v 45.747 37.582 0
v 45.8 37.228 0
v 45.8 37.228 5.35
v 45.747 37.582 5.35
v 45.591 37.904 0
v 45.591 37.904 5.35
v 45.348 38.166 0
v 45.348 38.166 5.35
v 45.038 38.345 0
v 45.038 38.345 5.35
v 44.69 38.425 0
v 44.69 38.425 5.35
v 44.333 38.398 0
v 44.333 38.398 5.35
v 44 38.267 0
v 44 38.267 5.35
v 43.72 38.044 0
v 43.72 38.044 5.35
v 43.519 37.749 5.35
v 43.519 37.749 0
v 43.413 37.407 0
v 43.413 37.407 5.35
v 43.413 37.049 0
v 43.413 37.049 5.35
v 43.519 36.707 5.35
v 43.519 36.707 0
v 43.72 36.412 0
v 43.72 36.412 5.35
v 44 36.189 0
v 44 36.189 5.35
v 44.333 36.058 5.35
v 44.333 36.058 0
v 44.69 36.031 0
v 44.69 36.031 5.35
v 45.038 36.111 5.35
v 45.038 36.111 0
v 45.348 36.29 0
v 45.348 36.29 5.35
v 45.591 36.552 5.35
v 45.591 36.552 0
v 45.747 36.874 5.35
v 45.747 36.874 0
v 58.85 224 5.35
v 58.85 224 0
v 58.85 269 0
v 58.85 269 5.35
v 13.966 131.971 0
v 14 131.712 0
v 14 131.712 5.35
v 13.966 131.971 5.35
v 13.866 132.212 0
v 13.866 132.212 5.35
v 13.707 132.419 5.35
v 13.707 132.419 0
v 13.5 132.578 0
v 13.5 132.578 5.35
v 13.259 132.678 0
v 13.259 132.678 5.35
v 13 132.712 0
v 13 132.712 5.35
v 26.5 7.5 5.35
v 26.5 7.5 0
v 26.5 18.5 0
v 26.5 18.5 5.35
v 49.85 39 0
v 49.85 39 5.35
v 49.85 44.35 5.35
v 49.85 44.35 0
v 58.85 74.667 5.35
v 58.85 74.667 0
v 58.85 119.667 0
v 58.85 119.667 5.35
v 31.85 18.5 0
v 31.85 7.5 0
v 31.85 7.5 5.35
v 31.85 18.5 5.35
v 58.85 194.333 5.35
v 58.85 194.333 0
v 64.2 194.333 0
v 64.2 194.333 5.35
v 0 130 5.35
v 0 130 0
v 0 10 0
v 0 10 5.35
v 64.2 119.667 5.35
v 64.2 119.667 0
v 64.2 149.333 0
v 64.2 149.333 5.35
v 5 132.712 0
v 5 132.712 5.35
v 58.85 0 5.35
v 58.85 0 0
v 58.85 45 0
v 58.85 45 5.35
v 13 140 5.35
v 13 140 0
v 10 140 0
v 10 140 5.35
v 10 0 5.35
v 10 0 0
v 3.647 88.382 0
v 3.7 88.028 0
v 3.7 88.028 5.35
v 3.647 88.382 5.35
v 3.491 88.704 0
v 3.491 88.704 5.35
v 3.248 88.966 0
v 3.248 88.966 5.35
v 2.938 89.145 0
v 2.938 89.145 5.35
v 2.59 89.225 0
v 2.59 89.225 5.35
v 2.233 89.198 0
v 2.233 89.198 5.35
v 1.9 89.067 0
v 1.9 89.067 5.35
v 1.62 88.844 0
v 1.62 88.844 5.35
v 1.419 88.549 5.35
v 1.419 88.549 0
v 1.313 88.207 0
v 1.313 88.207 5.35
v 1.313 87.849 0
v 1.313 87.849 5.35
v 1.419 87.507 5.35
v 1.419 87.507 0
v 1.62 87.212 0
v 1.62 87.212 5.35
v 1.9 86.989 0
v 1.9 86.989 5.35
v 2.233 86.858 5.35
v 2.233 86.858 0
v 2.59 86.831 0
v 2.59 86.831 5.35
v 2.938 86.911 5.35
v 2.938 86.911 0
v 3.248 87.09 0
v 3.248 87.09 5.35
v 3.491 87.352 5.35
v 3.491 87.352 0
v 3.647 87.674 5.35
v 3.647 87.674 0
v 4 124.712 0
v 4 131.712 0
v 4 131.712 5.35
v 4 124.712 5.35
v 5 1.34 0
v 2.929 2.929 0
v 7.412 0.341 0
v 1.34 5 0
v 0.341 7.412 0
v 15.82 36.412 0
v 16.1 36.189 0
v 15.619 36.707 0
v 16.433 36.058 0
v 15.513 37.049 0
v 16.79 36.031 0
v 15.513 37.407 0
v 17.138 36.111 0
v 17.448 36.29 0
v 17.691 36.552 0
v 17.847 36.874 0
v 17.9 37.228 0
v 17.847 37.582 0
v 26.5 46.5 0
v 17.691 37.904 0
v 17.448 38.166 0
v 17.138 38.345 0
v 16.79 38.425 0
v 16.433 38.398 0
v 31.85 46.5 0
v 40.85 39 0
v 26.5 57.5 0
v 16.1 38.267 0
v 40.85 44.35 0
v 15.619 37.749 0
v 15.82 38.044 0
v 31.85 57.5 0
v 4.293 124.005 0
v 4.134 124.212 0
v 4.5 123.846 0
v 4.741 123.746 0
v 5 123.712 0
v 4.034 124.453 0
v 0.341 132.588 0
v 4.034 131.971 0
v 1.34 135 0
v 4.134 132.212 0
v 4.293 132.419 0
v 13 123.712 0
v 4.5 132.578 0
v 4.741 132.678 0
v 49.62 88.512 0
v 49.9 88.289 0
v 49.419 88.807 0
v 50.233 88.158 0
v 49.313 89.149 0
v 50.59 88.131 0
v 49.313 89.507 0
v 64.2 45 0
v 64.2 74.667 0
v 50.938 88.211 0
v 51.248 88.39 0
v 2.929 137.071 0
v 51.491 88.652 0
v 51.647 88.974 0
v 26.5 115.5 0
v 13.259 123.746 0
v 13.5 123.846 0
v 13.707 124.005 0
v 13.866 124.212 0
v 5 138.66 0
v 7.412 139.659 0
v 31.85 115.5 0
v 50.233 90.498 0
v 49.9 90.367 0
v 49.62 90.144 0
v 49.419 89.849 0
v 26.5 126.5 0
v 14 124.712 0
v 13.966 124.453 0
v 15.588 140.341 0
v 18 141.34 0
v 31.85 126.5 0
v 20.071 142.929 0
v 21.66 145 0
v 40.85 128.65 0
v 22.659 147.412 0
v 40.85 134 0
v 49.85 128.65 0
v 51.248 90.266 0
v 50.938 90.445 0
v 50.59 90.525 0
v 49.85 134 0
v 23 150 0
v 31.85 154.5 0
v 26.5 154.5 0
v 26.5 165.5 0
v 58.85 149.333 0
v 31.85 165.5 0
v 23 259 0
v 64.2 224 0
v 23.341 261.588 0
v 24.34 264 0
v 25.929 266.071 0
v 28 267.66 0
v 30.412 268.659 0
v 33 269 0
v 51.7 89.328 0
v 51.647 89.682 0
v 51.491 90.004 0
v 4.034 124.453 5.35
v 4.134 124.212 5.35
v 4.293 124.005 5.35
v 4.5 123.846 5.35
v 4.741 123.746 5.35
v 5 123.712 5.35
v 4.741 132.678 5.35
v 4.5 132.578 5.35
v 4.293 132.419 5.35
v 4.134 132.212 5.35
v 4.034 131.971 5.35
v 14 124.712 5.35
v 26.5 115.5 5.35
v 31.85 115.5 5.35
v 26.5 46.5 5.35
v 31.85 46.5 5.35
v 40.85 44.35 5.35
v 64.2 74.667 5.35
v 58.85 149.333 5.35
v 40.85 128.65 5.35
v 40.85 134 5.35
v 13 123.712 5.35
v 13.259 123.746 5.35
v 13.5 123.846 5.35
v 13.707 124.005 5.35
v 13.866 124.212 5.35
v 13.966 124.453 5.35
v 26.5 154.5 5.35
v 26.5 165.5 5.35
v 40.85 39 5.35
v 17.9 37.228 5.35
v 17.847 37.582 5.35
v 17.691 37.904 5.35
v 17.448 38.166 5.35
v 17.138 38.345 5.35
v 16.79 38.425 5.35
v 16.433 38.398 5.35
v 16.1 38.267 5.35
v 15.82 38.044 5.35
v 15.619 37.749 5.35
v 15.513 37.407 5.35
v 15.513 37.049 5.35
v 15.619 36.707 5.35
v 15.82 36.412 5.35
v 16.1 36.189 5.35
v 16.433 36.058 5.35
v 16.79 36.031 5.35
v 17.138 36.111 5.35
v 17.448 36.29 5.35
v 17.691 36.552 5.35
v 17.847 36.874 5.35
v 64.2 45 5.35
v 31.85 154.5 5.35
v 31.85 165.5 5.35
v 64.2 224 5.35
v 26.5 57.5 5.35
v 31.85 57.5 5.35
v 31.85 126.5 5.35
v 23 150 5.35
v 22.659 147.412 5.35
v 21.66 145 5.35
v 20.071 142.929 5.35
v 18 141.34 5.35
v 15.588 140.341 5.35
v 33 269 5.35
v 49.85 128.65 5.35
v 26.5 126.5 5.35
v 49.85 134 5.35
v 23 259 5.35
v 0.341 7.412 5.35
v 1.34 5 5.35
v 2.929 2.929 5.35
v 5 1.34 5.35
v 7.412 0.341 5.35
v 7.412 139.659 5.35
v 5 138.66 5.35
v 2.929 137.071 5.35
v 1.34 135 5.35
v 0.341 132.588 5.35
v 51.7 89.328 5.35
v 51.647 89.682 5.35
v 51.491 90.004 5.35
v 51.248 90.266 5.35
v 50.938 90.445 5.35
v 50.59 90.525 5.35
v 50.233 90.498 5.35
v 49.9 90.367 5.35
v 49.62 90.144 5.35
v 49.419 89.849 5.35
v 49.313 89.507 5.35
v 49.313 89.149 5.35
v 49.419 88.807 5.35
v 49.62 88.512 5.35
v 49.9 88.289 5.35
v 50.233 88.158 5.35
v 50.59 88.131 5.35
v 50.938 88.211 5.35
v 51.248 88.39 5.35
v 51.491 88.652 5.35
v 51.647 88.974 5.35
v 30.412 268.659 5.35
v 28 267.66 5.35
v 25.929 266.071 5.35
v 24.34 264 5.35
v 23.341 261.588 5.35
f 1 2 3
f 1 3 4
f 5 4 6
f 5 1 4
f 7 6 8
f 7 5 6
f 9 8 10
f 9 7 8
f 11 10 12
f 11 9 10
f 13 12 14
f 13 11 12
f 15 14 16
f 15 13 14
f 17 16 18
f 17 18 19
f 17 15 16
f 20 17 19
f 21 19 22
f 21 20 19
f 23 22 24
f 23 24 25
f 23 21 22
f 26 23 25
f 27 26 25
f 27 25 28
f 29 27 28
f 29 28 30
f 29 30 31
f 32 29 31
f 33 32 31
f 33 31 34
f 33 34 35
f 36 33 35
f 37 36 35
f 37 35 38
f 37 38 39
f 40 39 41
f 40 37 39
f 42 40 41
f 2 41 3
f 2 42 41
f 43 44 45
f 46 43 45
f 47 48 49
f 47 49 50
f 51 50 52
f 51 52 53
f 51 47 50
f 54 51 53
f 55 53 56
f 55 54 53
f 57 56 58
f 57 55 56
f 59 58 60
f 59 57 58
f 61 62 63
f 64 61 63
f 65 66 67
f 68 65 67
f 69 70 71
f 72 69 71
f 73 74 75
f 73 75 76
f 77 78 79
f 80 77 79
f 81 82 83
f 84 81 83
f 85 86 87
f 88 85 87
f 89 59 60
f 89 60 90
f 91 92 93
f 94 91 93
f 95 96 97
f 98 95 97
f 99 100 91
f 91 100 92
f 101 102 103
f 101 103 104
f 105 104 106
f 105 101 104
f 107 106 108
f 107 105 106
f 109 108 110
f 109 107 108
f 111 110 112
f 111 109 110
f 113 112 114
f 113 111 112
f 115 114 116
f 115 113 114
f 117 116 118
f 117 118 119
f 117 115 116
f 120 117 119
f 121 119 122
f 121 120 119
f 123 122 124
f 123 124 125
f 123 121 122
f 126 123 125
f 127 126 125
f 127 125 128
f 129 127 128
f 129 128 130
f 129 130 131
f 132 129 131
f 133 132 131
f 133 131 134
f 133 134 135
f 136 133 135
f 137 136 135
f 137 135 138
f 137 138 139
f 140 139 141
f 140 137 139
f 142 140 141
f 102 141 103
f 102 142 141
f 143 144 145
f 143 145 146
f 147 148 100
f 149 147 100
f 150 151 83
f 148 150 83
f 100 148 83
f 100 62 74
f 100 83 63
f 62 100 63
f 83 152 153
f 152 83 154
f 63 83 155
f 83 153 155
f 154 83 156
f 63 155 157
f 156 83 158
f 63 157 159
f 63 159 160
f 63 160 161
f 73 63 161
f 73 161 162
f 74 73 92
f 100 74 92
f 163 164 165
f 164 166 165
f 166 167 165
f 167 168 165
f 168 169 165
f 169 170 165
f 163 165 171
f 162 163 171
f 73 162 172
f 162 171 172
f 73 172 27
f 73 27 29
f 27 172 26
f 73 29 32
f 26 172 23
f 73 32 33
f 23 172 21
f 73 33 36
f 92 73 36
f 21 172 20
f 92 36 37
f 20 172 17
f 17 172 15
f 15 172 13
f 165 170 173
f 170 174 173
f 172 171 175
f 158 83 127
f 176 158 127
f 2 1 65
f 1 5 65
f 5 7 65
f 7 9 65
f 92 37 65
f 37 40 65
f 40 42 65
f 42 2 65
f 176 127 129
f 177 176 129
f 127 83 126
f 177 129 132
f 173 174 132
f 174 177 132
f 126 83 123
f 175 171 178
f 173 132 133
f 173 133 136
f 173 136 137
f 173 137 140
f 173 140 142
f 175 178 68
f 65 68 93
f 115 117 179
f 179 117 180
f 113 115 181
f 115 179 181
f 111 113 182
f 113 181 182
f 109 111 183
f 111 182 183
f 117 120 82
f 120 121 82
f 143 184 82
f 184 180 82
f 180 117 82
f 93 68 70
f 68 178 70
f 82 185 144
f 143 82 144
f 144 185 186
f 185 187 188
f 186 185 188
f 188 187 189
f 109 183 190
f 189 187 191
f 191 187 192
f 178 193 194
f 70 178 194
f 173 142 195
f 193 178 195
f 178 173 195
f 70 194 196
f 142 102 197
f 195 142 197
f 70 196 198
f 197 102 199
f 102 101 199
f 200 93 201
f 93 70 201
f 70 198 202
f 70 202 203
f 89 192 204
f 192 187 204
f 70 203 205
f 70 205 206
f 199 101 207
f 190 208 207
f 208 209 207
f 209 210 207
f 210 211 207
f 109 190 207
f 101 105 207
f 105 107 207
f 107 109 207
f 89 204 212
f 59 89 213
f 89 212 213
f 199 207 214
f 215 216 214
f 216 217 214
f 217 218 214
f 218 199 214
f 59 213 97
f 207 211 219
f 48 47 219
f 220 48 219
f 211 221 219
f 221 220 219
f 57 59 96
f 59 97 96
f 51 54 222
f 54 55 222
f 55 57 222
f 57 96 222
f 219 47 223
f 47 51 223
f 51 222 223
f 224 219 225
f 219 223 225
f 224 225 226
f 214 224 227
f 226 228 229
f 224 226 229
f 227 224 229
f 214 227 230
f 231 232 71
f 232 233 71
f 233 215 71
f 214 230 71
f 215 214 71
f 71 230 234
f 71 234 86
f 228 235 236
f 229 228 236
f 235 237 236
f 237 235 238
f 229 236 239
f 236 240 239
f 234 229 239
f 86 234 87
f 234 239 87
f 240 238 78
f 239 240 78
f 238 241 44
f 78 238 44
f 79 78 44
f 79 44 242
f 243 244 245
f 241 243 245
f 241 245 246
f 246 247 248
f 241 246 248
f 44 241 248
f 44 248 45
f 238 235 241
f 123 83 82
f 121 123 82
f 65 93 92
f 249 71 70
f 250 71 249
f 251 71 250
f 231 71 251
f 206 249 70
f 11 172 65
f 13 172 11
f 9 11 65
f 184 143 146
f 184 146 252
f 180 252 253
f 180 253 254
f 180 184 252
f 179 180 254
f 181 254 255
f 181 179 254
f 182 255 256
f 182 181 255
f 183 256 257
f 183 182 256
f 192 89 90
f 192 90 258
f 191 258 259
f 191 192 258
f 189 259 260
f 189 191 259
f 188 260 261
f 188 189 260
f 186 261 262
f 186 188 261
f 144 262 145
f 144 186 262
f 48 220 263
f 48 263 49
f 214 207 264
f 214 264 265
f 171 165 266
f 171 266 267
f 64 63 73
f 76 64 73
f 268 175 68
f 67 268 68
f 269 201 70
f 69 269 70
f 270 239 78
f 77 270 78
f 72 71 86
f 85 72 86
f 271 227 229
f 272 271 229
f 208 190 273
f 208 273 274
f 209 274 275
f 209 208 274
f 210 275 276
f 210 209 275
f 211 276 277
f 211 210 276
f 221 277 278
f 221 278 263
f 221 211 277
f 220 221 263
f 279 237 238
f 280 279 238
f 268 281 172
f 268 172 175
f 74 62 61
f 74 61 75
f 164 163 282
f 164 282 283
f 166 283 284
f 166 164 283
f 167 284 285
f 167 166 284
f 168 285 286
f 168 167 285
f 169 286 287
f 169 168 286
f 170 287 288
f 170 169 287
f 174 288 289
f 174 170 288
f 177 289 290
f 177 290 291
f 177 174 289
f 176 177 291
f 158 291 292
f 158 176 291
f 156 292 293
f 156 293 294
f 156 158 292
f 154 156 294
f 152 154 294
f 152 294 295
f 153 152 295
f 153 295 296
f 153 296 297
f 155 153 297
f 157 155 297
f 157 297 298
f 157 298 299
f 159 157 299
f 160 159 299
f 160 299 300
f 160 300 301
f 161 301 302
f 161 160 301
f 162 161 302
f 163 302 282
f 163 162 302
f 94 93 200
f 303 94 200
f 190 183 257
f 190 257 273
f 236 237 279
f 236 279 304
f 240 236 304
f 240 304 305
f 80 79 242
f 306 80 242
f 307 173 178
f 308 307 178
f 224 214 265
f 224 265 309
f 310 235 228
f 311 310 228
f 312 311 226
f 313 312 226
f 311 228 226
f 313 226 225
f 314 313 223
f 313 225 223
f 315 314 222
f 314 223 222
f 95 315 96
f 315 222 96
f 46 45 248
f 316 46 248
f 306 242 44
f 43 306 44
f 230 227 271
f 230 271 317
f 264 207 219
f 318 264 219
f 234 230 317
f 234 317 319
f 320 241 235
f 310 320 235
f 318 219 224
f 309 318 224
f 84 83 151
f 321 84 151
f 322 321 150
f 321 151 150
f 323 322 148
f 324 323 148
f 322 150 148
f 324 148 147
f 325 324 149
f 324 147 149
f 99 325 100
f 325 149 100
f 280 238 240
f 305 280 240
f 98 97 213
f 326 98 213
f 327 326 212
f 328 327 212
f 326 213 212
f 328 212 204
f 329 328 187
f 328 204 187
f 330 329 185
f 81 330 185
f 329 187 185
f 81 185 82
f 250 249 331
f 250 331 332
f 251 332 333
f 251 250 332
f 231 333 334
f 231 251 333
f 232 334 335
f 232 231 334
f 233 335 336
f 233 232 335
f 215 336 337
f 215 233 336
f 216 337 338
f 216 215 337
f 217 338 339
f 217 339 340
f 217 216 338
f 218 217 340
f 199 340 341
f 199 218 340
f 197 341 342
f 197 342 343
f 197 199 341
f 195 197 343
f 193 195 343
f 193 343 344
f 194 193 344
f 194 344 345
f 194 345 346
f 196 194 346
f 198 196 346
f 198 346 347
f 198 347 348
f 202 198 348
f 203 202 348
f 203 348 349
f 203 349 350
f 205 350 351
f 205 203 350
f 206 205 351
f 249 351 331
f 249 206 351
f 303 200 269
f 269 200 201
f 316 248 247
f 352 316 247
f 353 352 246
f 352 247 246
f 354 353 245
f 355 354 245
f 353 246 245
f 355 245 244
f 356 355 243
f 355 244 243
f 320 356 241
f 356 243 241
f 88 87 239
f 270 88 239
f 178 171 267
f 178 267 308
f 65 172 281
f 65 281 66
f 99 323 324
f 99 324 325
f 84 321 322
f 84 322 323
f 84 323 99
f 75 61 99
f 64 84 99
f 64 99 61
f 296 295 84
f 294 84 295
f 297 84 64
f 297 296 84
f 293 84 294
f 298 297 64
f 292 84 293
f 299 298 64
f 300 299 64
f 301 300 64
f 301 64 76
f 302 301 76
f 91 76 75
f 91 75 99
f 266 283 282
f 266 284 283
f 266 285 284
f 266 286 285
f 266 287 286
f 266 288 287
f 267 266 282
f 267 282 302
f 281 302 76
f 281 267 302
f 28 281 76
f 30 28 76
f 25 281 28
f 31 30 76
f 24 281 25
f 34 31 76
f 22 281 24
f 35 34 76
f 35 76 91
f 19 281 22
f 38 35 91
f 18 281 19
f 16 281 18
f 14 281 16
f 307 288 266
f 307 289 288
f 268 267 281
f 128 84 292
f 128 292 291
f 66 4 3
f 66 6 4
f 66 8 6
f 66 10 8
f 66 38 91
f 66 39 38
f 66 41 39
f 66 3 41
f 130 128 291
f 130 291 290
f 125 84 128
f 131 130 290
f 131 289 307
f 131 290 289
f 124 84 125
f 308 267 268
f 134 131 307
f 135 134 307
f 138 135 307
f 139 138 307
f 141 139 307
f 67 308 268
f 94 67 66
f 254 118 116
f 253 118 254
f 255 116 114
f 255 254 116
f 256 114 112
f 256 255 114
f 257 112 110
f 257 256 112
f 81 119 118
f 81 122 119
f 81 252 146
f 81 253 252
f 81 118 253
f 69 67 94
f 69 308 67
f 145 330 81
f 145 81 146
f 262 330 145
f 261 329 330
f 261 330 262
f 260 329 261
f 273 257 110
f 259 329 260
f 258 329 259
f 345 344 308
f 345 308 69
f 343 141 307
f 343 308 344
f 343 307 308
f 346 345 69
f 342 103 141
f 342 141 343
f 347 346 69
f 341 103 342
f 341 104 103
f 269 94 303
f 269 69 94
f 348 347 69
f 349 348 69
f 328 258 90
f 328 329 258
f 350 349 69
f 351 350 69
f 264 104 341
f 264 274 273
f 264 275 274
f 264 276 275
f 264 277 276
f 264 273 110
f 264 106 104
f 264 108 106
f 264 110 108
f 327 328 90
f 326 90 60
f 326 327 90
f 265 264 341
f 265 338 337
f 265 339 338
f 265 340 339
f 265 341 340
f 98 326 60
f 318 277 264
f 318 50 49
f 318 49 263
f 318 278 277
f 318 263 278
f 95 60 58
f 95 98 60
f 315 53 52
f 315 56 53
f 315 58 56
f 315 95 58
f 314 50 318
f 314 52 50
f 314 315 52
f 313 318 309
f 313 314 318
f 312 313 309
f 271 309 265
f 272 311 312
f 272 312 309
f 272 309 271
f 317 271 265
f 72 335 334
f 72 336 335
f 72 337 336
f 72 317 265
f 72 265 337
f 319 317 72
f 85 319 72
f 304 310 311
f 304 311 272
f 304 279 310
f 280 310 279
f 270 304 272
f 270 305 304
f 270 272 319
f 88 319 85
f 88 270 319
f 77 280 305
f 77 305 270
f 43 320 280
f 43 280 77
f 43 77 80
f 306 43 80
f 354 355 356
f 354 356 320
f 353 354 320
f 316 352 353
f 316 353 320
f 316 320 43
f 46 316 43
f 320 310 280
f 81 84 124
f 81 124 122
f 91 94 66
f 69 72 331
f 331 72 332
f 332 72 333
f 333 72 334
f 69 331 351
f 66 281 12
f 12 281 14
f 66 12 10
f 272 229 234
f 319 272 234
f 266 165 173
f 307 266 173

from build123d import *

# Parameters (mm, degrees)
MODEL_R             = 1.2
MODEL_W             = 5.35
MODEL_H             = 11
MODEL_W_2           = 9
MODEL_H_2           = 5.35
BOSS_EXTRUDE1_DEPTH = 5.35


with BuildPart() as part:
    # Model → Boss-Extrude1 (new body)
    with BuildSketch(Plane.XY):
        with BuildLine():
            Line((58.85, 269), (33, 269))
            ThreePointArc((33, 269), (25.928932188, 266.071067812), (23, 259))
            Line((23, 259), (23, 150))
            ThreePointArc((23, 150), (20.071067812, 142.928932188), (13, 140))
            Line((13, 140), (10, 140))
            ThreePointArc((10, 140), (2.928932188, 137.071067812), (0, 130))
            Line((0, 130), (0, 10))
            ThreePointArc((0, 10), (2.928932188, 2.928932188), (10, 0))
            Line((10, 0), (58.85, 0))
            Line((58.85, 0), (58.85, 45))
            Line((58.85, 45), (64.2, 45))
            Line((64.2, 45), (64.2, 74.666666667))
            Line((64.2, 74.666666667), (58.85, 74.666666667))
            Line((58.85, 74.666666667), (58.85, 119.666666667))
            Line((58.85, 119.666666667), (64.2, 119.666666667))
            Line((64.2, 119.666666667), (64.2, 149.333333333))
            Line((64.2, 149.333333333), (58.85, 149.333333333))
            Line((58.85, 149.333333333), (58.85, 194.333333333))
            Line((58.85, 194.333333333), (64.2, 194.333333333))
            Line((64.2, 194.333333333), (64.2, 224))
            Line((64.2, 224), (58.85, 224))
            Line((58.85, 224), (58.85, 269))
        make_face()
        with Locations((2.5, 88.027872499)):
            Circle(MODEL_R, mode=Mode.SUBTRACT)
        with Locations((44.6, 37.227872499)):
            Circle(MODEL_R, mode=Mode.SUBTRACT)
        with Locations((16.7, 37.227872499)):
            Circle(MODEL_R, mode=Mode.SUBTRACT)
        with Locations((50.5, 89.327872499)):
            Circle(MODEL_R, mode=Mode.SUBTRACT)
        with Locations((29.175, 160)):
            Rectangle(MODEL_W, MODEL_H, mode=Mode.SUBTRACT)
        with Locations((45.35, 131.325)):
            Rectangle(MODEL_W_2, MODEL_H_2, mode=Mode.SUBTRACT)
        with Locations((29.175, 121)):
            Rectangle(MODEL_W, MODEL_H, mode=Mode.SUBTRACT)
        with Locations((45.35, 41.675)):
            Rectangle(MODEL_W_2, MODEL_H_2, mode=Mode.SUBTRACT)
        with Locations((29.175, 52)):
            Rectangle(MODEL_W, MODEL_H, mode=Mode.SUBTRACT)
        with Locations((29.175, 13)):
            Rectangle(MODEL_W, MODEL_H, mode=Mode.SUBTRACT)
        with BuildLine():
            Line((5, 123.711859862), (13, 123.711859862))
            ThreePointArc((13, 123.711859862), (13.707106781, 124.004753081), (14, 124.711859862))
            Line((14, 124.711859862), (14, 131.711859862))
            ThreePointArc((14, 131.711859862), (13.707106781, 132.418966643), (13, 132.711859862))
            Line((13, 132.711859862), (5, 132.711859862))
            ThreePointArc((5, 132.711859862), (4.292893219, 132.418966643), (4, 131.711859862))
            Line((4, 131.711859862), (4, 124.711859862))
            ThreePointArc((4, 124.711859862), (4.292893219, 124.004753081), (5, 123.711859862))
        make_face(mode=Mode.SUBTRACT)
    extrude(amount=BOSS_EXTRUDE1_DEPTH)


solid = part.part
